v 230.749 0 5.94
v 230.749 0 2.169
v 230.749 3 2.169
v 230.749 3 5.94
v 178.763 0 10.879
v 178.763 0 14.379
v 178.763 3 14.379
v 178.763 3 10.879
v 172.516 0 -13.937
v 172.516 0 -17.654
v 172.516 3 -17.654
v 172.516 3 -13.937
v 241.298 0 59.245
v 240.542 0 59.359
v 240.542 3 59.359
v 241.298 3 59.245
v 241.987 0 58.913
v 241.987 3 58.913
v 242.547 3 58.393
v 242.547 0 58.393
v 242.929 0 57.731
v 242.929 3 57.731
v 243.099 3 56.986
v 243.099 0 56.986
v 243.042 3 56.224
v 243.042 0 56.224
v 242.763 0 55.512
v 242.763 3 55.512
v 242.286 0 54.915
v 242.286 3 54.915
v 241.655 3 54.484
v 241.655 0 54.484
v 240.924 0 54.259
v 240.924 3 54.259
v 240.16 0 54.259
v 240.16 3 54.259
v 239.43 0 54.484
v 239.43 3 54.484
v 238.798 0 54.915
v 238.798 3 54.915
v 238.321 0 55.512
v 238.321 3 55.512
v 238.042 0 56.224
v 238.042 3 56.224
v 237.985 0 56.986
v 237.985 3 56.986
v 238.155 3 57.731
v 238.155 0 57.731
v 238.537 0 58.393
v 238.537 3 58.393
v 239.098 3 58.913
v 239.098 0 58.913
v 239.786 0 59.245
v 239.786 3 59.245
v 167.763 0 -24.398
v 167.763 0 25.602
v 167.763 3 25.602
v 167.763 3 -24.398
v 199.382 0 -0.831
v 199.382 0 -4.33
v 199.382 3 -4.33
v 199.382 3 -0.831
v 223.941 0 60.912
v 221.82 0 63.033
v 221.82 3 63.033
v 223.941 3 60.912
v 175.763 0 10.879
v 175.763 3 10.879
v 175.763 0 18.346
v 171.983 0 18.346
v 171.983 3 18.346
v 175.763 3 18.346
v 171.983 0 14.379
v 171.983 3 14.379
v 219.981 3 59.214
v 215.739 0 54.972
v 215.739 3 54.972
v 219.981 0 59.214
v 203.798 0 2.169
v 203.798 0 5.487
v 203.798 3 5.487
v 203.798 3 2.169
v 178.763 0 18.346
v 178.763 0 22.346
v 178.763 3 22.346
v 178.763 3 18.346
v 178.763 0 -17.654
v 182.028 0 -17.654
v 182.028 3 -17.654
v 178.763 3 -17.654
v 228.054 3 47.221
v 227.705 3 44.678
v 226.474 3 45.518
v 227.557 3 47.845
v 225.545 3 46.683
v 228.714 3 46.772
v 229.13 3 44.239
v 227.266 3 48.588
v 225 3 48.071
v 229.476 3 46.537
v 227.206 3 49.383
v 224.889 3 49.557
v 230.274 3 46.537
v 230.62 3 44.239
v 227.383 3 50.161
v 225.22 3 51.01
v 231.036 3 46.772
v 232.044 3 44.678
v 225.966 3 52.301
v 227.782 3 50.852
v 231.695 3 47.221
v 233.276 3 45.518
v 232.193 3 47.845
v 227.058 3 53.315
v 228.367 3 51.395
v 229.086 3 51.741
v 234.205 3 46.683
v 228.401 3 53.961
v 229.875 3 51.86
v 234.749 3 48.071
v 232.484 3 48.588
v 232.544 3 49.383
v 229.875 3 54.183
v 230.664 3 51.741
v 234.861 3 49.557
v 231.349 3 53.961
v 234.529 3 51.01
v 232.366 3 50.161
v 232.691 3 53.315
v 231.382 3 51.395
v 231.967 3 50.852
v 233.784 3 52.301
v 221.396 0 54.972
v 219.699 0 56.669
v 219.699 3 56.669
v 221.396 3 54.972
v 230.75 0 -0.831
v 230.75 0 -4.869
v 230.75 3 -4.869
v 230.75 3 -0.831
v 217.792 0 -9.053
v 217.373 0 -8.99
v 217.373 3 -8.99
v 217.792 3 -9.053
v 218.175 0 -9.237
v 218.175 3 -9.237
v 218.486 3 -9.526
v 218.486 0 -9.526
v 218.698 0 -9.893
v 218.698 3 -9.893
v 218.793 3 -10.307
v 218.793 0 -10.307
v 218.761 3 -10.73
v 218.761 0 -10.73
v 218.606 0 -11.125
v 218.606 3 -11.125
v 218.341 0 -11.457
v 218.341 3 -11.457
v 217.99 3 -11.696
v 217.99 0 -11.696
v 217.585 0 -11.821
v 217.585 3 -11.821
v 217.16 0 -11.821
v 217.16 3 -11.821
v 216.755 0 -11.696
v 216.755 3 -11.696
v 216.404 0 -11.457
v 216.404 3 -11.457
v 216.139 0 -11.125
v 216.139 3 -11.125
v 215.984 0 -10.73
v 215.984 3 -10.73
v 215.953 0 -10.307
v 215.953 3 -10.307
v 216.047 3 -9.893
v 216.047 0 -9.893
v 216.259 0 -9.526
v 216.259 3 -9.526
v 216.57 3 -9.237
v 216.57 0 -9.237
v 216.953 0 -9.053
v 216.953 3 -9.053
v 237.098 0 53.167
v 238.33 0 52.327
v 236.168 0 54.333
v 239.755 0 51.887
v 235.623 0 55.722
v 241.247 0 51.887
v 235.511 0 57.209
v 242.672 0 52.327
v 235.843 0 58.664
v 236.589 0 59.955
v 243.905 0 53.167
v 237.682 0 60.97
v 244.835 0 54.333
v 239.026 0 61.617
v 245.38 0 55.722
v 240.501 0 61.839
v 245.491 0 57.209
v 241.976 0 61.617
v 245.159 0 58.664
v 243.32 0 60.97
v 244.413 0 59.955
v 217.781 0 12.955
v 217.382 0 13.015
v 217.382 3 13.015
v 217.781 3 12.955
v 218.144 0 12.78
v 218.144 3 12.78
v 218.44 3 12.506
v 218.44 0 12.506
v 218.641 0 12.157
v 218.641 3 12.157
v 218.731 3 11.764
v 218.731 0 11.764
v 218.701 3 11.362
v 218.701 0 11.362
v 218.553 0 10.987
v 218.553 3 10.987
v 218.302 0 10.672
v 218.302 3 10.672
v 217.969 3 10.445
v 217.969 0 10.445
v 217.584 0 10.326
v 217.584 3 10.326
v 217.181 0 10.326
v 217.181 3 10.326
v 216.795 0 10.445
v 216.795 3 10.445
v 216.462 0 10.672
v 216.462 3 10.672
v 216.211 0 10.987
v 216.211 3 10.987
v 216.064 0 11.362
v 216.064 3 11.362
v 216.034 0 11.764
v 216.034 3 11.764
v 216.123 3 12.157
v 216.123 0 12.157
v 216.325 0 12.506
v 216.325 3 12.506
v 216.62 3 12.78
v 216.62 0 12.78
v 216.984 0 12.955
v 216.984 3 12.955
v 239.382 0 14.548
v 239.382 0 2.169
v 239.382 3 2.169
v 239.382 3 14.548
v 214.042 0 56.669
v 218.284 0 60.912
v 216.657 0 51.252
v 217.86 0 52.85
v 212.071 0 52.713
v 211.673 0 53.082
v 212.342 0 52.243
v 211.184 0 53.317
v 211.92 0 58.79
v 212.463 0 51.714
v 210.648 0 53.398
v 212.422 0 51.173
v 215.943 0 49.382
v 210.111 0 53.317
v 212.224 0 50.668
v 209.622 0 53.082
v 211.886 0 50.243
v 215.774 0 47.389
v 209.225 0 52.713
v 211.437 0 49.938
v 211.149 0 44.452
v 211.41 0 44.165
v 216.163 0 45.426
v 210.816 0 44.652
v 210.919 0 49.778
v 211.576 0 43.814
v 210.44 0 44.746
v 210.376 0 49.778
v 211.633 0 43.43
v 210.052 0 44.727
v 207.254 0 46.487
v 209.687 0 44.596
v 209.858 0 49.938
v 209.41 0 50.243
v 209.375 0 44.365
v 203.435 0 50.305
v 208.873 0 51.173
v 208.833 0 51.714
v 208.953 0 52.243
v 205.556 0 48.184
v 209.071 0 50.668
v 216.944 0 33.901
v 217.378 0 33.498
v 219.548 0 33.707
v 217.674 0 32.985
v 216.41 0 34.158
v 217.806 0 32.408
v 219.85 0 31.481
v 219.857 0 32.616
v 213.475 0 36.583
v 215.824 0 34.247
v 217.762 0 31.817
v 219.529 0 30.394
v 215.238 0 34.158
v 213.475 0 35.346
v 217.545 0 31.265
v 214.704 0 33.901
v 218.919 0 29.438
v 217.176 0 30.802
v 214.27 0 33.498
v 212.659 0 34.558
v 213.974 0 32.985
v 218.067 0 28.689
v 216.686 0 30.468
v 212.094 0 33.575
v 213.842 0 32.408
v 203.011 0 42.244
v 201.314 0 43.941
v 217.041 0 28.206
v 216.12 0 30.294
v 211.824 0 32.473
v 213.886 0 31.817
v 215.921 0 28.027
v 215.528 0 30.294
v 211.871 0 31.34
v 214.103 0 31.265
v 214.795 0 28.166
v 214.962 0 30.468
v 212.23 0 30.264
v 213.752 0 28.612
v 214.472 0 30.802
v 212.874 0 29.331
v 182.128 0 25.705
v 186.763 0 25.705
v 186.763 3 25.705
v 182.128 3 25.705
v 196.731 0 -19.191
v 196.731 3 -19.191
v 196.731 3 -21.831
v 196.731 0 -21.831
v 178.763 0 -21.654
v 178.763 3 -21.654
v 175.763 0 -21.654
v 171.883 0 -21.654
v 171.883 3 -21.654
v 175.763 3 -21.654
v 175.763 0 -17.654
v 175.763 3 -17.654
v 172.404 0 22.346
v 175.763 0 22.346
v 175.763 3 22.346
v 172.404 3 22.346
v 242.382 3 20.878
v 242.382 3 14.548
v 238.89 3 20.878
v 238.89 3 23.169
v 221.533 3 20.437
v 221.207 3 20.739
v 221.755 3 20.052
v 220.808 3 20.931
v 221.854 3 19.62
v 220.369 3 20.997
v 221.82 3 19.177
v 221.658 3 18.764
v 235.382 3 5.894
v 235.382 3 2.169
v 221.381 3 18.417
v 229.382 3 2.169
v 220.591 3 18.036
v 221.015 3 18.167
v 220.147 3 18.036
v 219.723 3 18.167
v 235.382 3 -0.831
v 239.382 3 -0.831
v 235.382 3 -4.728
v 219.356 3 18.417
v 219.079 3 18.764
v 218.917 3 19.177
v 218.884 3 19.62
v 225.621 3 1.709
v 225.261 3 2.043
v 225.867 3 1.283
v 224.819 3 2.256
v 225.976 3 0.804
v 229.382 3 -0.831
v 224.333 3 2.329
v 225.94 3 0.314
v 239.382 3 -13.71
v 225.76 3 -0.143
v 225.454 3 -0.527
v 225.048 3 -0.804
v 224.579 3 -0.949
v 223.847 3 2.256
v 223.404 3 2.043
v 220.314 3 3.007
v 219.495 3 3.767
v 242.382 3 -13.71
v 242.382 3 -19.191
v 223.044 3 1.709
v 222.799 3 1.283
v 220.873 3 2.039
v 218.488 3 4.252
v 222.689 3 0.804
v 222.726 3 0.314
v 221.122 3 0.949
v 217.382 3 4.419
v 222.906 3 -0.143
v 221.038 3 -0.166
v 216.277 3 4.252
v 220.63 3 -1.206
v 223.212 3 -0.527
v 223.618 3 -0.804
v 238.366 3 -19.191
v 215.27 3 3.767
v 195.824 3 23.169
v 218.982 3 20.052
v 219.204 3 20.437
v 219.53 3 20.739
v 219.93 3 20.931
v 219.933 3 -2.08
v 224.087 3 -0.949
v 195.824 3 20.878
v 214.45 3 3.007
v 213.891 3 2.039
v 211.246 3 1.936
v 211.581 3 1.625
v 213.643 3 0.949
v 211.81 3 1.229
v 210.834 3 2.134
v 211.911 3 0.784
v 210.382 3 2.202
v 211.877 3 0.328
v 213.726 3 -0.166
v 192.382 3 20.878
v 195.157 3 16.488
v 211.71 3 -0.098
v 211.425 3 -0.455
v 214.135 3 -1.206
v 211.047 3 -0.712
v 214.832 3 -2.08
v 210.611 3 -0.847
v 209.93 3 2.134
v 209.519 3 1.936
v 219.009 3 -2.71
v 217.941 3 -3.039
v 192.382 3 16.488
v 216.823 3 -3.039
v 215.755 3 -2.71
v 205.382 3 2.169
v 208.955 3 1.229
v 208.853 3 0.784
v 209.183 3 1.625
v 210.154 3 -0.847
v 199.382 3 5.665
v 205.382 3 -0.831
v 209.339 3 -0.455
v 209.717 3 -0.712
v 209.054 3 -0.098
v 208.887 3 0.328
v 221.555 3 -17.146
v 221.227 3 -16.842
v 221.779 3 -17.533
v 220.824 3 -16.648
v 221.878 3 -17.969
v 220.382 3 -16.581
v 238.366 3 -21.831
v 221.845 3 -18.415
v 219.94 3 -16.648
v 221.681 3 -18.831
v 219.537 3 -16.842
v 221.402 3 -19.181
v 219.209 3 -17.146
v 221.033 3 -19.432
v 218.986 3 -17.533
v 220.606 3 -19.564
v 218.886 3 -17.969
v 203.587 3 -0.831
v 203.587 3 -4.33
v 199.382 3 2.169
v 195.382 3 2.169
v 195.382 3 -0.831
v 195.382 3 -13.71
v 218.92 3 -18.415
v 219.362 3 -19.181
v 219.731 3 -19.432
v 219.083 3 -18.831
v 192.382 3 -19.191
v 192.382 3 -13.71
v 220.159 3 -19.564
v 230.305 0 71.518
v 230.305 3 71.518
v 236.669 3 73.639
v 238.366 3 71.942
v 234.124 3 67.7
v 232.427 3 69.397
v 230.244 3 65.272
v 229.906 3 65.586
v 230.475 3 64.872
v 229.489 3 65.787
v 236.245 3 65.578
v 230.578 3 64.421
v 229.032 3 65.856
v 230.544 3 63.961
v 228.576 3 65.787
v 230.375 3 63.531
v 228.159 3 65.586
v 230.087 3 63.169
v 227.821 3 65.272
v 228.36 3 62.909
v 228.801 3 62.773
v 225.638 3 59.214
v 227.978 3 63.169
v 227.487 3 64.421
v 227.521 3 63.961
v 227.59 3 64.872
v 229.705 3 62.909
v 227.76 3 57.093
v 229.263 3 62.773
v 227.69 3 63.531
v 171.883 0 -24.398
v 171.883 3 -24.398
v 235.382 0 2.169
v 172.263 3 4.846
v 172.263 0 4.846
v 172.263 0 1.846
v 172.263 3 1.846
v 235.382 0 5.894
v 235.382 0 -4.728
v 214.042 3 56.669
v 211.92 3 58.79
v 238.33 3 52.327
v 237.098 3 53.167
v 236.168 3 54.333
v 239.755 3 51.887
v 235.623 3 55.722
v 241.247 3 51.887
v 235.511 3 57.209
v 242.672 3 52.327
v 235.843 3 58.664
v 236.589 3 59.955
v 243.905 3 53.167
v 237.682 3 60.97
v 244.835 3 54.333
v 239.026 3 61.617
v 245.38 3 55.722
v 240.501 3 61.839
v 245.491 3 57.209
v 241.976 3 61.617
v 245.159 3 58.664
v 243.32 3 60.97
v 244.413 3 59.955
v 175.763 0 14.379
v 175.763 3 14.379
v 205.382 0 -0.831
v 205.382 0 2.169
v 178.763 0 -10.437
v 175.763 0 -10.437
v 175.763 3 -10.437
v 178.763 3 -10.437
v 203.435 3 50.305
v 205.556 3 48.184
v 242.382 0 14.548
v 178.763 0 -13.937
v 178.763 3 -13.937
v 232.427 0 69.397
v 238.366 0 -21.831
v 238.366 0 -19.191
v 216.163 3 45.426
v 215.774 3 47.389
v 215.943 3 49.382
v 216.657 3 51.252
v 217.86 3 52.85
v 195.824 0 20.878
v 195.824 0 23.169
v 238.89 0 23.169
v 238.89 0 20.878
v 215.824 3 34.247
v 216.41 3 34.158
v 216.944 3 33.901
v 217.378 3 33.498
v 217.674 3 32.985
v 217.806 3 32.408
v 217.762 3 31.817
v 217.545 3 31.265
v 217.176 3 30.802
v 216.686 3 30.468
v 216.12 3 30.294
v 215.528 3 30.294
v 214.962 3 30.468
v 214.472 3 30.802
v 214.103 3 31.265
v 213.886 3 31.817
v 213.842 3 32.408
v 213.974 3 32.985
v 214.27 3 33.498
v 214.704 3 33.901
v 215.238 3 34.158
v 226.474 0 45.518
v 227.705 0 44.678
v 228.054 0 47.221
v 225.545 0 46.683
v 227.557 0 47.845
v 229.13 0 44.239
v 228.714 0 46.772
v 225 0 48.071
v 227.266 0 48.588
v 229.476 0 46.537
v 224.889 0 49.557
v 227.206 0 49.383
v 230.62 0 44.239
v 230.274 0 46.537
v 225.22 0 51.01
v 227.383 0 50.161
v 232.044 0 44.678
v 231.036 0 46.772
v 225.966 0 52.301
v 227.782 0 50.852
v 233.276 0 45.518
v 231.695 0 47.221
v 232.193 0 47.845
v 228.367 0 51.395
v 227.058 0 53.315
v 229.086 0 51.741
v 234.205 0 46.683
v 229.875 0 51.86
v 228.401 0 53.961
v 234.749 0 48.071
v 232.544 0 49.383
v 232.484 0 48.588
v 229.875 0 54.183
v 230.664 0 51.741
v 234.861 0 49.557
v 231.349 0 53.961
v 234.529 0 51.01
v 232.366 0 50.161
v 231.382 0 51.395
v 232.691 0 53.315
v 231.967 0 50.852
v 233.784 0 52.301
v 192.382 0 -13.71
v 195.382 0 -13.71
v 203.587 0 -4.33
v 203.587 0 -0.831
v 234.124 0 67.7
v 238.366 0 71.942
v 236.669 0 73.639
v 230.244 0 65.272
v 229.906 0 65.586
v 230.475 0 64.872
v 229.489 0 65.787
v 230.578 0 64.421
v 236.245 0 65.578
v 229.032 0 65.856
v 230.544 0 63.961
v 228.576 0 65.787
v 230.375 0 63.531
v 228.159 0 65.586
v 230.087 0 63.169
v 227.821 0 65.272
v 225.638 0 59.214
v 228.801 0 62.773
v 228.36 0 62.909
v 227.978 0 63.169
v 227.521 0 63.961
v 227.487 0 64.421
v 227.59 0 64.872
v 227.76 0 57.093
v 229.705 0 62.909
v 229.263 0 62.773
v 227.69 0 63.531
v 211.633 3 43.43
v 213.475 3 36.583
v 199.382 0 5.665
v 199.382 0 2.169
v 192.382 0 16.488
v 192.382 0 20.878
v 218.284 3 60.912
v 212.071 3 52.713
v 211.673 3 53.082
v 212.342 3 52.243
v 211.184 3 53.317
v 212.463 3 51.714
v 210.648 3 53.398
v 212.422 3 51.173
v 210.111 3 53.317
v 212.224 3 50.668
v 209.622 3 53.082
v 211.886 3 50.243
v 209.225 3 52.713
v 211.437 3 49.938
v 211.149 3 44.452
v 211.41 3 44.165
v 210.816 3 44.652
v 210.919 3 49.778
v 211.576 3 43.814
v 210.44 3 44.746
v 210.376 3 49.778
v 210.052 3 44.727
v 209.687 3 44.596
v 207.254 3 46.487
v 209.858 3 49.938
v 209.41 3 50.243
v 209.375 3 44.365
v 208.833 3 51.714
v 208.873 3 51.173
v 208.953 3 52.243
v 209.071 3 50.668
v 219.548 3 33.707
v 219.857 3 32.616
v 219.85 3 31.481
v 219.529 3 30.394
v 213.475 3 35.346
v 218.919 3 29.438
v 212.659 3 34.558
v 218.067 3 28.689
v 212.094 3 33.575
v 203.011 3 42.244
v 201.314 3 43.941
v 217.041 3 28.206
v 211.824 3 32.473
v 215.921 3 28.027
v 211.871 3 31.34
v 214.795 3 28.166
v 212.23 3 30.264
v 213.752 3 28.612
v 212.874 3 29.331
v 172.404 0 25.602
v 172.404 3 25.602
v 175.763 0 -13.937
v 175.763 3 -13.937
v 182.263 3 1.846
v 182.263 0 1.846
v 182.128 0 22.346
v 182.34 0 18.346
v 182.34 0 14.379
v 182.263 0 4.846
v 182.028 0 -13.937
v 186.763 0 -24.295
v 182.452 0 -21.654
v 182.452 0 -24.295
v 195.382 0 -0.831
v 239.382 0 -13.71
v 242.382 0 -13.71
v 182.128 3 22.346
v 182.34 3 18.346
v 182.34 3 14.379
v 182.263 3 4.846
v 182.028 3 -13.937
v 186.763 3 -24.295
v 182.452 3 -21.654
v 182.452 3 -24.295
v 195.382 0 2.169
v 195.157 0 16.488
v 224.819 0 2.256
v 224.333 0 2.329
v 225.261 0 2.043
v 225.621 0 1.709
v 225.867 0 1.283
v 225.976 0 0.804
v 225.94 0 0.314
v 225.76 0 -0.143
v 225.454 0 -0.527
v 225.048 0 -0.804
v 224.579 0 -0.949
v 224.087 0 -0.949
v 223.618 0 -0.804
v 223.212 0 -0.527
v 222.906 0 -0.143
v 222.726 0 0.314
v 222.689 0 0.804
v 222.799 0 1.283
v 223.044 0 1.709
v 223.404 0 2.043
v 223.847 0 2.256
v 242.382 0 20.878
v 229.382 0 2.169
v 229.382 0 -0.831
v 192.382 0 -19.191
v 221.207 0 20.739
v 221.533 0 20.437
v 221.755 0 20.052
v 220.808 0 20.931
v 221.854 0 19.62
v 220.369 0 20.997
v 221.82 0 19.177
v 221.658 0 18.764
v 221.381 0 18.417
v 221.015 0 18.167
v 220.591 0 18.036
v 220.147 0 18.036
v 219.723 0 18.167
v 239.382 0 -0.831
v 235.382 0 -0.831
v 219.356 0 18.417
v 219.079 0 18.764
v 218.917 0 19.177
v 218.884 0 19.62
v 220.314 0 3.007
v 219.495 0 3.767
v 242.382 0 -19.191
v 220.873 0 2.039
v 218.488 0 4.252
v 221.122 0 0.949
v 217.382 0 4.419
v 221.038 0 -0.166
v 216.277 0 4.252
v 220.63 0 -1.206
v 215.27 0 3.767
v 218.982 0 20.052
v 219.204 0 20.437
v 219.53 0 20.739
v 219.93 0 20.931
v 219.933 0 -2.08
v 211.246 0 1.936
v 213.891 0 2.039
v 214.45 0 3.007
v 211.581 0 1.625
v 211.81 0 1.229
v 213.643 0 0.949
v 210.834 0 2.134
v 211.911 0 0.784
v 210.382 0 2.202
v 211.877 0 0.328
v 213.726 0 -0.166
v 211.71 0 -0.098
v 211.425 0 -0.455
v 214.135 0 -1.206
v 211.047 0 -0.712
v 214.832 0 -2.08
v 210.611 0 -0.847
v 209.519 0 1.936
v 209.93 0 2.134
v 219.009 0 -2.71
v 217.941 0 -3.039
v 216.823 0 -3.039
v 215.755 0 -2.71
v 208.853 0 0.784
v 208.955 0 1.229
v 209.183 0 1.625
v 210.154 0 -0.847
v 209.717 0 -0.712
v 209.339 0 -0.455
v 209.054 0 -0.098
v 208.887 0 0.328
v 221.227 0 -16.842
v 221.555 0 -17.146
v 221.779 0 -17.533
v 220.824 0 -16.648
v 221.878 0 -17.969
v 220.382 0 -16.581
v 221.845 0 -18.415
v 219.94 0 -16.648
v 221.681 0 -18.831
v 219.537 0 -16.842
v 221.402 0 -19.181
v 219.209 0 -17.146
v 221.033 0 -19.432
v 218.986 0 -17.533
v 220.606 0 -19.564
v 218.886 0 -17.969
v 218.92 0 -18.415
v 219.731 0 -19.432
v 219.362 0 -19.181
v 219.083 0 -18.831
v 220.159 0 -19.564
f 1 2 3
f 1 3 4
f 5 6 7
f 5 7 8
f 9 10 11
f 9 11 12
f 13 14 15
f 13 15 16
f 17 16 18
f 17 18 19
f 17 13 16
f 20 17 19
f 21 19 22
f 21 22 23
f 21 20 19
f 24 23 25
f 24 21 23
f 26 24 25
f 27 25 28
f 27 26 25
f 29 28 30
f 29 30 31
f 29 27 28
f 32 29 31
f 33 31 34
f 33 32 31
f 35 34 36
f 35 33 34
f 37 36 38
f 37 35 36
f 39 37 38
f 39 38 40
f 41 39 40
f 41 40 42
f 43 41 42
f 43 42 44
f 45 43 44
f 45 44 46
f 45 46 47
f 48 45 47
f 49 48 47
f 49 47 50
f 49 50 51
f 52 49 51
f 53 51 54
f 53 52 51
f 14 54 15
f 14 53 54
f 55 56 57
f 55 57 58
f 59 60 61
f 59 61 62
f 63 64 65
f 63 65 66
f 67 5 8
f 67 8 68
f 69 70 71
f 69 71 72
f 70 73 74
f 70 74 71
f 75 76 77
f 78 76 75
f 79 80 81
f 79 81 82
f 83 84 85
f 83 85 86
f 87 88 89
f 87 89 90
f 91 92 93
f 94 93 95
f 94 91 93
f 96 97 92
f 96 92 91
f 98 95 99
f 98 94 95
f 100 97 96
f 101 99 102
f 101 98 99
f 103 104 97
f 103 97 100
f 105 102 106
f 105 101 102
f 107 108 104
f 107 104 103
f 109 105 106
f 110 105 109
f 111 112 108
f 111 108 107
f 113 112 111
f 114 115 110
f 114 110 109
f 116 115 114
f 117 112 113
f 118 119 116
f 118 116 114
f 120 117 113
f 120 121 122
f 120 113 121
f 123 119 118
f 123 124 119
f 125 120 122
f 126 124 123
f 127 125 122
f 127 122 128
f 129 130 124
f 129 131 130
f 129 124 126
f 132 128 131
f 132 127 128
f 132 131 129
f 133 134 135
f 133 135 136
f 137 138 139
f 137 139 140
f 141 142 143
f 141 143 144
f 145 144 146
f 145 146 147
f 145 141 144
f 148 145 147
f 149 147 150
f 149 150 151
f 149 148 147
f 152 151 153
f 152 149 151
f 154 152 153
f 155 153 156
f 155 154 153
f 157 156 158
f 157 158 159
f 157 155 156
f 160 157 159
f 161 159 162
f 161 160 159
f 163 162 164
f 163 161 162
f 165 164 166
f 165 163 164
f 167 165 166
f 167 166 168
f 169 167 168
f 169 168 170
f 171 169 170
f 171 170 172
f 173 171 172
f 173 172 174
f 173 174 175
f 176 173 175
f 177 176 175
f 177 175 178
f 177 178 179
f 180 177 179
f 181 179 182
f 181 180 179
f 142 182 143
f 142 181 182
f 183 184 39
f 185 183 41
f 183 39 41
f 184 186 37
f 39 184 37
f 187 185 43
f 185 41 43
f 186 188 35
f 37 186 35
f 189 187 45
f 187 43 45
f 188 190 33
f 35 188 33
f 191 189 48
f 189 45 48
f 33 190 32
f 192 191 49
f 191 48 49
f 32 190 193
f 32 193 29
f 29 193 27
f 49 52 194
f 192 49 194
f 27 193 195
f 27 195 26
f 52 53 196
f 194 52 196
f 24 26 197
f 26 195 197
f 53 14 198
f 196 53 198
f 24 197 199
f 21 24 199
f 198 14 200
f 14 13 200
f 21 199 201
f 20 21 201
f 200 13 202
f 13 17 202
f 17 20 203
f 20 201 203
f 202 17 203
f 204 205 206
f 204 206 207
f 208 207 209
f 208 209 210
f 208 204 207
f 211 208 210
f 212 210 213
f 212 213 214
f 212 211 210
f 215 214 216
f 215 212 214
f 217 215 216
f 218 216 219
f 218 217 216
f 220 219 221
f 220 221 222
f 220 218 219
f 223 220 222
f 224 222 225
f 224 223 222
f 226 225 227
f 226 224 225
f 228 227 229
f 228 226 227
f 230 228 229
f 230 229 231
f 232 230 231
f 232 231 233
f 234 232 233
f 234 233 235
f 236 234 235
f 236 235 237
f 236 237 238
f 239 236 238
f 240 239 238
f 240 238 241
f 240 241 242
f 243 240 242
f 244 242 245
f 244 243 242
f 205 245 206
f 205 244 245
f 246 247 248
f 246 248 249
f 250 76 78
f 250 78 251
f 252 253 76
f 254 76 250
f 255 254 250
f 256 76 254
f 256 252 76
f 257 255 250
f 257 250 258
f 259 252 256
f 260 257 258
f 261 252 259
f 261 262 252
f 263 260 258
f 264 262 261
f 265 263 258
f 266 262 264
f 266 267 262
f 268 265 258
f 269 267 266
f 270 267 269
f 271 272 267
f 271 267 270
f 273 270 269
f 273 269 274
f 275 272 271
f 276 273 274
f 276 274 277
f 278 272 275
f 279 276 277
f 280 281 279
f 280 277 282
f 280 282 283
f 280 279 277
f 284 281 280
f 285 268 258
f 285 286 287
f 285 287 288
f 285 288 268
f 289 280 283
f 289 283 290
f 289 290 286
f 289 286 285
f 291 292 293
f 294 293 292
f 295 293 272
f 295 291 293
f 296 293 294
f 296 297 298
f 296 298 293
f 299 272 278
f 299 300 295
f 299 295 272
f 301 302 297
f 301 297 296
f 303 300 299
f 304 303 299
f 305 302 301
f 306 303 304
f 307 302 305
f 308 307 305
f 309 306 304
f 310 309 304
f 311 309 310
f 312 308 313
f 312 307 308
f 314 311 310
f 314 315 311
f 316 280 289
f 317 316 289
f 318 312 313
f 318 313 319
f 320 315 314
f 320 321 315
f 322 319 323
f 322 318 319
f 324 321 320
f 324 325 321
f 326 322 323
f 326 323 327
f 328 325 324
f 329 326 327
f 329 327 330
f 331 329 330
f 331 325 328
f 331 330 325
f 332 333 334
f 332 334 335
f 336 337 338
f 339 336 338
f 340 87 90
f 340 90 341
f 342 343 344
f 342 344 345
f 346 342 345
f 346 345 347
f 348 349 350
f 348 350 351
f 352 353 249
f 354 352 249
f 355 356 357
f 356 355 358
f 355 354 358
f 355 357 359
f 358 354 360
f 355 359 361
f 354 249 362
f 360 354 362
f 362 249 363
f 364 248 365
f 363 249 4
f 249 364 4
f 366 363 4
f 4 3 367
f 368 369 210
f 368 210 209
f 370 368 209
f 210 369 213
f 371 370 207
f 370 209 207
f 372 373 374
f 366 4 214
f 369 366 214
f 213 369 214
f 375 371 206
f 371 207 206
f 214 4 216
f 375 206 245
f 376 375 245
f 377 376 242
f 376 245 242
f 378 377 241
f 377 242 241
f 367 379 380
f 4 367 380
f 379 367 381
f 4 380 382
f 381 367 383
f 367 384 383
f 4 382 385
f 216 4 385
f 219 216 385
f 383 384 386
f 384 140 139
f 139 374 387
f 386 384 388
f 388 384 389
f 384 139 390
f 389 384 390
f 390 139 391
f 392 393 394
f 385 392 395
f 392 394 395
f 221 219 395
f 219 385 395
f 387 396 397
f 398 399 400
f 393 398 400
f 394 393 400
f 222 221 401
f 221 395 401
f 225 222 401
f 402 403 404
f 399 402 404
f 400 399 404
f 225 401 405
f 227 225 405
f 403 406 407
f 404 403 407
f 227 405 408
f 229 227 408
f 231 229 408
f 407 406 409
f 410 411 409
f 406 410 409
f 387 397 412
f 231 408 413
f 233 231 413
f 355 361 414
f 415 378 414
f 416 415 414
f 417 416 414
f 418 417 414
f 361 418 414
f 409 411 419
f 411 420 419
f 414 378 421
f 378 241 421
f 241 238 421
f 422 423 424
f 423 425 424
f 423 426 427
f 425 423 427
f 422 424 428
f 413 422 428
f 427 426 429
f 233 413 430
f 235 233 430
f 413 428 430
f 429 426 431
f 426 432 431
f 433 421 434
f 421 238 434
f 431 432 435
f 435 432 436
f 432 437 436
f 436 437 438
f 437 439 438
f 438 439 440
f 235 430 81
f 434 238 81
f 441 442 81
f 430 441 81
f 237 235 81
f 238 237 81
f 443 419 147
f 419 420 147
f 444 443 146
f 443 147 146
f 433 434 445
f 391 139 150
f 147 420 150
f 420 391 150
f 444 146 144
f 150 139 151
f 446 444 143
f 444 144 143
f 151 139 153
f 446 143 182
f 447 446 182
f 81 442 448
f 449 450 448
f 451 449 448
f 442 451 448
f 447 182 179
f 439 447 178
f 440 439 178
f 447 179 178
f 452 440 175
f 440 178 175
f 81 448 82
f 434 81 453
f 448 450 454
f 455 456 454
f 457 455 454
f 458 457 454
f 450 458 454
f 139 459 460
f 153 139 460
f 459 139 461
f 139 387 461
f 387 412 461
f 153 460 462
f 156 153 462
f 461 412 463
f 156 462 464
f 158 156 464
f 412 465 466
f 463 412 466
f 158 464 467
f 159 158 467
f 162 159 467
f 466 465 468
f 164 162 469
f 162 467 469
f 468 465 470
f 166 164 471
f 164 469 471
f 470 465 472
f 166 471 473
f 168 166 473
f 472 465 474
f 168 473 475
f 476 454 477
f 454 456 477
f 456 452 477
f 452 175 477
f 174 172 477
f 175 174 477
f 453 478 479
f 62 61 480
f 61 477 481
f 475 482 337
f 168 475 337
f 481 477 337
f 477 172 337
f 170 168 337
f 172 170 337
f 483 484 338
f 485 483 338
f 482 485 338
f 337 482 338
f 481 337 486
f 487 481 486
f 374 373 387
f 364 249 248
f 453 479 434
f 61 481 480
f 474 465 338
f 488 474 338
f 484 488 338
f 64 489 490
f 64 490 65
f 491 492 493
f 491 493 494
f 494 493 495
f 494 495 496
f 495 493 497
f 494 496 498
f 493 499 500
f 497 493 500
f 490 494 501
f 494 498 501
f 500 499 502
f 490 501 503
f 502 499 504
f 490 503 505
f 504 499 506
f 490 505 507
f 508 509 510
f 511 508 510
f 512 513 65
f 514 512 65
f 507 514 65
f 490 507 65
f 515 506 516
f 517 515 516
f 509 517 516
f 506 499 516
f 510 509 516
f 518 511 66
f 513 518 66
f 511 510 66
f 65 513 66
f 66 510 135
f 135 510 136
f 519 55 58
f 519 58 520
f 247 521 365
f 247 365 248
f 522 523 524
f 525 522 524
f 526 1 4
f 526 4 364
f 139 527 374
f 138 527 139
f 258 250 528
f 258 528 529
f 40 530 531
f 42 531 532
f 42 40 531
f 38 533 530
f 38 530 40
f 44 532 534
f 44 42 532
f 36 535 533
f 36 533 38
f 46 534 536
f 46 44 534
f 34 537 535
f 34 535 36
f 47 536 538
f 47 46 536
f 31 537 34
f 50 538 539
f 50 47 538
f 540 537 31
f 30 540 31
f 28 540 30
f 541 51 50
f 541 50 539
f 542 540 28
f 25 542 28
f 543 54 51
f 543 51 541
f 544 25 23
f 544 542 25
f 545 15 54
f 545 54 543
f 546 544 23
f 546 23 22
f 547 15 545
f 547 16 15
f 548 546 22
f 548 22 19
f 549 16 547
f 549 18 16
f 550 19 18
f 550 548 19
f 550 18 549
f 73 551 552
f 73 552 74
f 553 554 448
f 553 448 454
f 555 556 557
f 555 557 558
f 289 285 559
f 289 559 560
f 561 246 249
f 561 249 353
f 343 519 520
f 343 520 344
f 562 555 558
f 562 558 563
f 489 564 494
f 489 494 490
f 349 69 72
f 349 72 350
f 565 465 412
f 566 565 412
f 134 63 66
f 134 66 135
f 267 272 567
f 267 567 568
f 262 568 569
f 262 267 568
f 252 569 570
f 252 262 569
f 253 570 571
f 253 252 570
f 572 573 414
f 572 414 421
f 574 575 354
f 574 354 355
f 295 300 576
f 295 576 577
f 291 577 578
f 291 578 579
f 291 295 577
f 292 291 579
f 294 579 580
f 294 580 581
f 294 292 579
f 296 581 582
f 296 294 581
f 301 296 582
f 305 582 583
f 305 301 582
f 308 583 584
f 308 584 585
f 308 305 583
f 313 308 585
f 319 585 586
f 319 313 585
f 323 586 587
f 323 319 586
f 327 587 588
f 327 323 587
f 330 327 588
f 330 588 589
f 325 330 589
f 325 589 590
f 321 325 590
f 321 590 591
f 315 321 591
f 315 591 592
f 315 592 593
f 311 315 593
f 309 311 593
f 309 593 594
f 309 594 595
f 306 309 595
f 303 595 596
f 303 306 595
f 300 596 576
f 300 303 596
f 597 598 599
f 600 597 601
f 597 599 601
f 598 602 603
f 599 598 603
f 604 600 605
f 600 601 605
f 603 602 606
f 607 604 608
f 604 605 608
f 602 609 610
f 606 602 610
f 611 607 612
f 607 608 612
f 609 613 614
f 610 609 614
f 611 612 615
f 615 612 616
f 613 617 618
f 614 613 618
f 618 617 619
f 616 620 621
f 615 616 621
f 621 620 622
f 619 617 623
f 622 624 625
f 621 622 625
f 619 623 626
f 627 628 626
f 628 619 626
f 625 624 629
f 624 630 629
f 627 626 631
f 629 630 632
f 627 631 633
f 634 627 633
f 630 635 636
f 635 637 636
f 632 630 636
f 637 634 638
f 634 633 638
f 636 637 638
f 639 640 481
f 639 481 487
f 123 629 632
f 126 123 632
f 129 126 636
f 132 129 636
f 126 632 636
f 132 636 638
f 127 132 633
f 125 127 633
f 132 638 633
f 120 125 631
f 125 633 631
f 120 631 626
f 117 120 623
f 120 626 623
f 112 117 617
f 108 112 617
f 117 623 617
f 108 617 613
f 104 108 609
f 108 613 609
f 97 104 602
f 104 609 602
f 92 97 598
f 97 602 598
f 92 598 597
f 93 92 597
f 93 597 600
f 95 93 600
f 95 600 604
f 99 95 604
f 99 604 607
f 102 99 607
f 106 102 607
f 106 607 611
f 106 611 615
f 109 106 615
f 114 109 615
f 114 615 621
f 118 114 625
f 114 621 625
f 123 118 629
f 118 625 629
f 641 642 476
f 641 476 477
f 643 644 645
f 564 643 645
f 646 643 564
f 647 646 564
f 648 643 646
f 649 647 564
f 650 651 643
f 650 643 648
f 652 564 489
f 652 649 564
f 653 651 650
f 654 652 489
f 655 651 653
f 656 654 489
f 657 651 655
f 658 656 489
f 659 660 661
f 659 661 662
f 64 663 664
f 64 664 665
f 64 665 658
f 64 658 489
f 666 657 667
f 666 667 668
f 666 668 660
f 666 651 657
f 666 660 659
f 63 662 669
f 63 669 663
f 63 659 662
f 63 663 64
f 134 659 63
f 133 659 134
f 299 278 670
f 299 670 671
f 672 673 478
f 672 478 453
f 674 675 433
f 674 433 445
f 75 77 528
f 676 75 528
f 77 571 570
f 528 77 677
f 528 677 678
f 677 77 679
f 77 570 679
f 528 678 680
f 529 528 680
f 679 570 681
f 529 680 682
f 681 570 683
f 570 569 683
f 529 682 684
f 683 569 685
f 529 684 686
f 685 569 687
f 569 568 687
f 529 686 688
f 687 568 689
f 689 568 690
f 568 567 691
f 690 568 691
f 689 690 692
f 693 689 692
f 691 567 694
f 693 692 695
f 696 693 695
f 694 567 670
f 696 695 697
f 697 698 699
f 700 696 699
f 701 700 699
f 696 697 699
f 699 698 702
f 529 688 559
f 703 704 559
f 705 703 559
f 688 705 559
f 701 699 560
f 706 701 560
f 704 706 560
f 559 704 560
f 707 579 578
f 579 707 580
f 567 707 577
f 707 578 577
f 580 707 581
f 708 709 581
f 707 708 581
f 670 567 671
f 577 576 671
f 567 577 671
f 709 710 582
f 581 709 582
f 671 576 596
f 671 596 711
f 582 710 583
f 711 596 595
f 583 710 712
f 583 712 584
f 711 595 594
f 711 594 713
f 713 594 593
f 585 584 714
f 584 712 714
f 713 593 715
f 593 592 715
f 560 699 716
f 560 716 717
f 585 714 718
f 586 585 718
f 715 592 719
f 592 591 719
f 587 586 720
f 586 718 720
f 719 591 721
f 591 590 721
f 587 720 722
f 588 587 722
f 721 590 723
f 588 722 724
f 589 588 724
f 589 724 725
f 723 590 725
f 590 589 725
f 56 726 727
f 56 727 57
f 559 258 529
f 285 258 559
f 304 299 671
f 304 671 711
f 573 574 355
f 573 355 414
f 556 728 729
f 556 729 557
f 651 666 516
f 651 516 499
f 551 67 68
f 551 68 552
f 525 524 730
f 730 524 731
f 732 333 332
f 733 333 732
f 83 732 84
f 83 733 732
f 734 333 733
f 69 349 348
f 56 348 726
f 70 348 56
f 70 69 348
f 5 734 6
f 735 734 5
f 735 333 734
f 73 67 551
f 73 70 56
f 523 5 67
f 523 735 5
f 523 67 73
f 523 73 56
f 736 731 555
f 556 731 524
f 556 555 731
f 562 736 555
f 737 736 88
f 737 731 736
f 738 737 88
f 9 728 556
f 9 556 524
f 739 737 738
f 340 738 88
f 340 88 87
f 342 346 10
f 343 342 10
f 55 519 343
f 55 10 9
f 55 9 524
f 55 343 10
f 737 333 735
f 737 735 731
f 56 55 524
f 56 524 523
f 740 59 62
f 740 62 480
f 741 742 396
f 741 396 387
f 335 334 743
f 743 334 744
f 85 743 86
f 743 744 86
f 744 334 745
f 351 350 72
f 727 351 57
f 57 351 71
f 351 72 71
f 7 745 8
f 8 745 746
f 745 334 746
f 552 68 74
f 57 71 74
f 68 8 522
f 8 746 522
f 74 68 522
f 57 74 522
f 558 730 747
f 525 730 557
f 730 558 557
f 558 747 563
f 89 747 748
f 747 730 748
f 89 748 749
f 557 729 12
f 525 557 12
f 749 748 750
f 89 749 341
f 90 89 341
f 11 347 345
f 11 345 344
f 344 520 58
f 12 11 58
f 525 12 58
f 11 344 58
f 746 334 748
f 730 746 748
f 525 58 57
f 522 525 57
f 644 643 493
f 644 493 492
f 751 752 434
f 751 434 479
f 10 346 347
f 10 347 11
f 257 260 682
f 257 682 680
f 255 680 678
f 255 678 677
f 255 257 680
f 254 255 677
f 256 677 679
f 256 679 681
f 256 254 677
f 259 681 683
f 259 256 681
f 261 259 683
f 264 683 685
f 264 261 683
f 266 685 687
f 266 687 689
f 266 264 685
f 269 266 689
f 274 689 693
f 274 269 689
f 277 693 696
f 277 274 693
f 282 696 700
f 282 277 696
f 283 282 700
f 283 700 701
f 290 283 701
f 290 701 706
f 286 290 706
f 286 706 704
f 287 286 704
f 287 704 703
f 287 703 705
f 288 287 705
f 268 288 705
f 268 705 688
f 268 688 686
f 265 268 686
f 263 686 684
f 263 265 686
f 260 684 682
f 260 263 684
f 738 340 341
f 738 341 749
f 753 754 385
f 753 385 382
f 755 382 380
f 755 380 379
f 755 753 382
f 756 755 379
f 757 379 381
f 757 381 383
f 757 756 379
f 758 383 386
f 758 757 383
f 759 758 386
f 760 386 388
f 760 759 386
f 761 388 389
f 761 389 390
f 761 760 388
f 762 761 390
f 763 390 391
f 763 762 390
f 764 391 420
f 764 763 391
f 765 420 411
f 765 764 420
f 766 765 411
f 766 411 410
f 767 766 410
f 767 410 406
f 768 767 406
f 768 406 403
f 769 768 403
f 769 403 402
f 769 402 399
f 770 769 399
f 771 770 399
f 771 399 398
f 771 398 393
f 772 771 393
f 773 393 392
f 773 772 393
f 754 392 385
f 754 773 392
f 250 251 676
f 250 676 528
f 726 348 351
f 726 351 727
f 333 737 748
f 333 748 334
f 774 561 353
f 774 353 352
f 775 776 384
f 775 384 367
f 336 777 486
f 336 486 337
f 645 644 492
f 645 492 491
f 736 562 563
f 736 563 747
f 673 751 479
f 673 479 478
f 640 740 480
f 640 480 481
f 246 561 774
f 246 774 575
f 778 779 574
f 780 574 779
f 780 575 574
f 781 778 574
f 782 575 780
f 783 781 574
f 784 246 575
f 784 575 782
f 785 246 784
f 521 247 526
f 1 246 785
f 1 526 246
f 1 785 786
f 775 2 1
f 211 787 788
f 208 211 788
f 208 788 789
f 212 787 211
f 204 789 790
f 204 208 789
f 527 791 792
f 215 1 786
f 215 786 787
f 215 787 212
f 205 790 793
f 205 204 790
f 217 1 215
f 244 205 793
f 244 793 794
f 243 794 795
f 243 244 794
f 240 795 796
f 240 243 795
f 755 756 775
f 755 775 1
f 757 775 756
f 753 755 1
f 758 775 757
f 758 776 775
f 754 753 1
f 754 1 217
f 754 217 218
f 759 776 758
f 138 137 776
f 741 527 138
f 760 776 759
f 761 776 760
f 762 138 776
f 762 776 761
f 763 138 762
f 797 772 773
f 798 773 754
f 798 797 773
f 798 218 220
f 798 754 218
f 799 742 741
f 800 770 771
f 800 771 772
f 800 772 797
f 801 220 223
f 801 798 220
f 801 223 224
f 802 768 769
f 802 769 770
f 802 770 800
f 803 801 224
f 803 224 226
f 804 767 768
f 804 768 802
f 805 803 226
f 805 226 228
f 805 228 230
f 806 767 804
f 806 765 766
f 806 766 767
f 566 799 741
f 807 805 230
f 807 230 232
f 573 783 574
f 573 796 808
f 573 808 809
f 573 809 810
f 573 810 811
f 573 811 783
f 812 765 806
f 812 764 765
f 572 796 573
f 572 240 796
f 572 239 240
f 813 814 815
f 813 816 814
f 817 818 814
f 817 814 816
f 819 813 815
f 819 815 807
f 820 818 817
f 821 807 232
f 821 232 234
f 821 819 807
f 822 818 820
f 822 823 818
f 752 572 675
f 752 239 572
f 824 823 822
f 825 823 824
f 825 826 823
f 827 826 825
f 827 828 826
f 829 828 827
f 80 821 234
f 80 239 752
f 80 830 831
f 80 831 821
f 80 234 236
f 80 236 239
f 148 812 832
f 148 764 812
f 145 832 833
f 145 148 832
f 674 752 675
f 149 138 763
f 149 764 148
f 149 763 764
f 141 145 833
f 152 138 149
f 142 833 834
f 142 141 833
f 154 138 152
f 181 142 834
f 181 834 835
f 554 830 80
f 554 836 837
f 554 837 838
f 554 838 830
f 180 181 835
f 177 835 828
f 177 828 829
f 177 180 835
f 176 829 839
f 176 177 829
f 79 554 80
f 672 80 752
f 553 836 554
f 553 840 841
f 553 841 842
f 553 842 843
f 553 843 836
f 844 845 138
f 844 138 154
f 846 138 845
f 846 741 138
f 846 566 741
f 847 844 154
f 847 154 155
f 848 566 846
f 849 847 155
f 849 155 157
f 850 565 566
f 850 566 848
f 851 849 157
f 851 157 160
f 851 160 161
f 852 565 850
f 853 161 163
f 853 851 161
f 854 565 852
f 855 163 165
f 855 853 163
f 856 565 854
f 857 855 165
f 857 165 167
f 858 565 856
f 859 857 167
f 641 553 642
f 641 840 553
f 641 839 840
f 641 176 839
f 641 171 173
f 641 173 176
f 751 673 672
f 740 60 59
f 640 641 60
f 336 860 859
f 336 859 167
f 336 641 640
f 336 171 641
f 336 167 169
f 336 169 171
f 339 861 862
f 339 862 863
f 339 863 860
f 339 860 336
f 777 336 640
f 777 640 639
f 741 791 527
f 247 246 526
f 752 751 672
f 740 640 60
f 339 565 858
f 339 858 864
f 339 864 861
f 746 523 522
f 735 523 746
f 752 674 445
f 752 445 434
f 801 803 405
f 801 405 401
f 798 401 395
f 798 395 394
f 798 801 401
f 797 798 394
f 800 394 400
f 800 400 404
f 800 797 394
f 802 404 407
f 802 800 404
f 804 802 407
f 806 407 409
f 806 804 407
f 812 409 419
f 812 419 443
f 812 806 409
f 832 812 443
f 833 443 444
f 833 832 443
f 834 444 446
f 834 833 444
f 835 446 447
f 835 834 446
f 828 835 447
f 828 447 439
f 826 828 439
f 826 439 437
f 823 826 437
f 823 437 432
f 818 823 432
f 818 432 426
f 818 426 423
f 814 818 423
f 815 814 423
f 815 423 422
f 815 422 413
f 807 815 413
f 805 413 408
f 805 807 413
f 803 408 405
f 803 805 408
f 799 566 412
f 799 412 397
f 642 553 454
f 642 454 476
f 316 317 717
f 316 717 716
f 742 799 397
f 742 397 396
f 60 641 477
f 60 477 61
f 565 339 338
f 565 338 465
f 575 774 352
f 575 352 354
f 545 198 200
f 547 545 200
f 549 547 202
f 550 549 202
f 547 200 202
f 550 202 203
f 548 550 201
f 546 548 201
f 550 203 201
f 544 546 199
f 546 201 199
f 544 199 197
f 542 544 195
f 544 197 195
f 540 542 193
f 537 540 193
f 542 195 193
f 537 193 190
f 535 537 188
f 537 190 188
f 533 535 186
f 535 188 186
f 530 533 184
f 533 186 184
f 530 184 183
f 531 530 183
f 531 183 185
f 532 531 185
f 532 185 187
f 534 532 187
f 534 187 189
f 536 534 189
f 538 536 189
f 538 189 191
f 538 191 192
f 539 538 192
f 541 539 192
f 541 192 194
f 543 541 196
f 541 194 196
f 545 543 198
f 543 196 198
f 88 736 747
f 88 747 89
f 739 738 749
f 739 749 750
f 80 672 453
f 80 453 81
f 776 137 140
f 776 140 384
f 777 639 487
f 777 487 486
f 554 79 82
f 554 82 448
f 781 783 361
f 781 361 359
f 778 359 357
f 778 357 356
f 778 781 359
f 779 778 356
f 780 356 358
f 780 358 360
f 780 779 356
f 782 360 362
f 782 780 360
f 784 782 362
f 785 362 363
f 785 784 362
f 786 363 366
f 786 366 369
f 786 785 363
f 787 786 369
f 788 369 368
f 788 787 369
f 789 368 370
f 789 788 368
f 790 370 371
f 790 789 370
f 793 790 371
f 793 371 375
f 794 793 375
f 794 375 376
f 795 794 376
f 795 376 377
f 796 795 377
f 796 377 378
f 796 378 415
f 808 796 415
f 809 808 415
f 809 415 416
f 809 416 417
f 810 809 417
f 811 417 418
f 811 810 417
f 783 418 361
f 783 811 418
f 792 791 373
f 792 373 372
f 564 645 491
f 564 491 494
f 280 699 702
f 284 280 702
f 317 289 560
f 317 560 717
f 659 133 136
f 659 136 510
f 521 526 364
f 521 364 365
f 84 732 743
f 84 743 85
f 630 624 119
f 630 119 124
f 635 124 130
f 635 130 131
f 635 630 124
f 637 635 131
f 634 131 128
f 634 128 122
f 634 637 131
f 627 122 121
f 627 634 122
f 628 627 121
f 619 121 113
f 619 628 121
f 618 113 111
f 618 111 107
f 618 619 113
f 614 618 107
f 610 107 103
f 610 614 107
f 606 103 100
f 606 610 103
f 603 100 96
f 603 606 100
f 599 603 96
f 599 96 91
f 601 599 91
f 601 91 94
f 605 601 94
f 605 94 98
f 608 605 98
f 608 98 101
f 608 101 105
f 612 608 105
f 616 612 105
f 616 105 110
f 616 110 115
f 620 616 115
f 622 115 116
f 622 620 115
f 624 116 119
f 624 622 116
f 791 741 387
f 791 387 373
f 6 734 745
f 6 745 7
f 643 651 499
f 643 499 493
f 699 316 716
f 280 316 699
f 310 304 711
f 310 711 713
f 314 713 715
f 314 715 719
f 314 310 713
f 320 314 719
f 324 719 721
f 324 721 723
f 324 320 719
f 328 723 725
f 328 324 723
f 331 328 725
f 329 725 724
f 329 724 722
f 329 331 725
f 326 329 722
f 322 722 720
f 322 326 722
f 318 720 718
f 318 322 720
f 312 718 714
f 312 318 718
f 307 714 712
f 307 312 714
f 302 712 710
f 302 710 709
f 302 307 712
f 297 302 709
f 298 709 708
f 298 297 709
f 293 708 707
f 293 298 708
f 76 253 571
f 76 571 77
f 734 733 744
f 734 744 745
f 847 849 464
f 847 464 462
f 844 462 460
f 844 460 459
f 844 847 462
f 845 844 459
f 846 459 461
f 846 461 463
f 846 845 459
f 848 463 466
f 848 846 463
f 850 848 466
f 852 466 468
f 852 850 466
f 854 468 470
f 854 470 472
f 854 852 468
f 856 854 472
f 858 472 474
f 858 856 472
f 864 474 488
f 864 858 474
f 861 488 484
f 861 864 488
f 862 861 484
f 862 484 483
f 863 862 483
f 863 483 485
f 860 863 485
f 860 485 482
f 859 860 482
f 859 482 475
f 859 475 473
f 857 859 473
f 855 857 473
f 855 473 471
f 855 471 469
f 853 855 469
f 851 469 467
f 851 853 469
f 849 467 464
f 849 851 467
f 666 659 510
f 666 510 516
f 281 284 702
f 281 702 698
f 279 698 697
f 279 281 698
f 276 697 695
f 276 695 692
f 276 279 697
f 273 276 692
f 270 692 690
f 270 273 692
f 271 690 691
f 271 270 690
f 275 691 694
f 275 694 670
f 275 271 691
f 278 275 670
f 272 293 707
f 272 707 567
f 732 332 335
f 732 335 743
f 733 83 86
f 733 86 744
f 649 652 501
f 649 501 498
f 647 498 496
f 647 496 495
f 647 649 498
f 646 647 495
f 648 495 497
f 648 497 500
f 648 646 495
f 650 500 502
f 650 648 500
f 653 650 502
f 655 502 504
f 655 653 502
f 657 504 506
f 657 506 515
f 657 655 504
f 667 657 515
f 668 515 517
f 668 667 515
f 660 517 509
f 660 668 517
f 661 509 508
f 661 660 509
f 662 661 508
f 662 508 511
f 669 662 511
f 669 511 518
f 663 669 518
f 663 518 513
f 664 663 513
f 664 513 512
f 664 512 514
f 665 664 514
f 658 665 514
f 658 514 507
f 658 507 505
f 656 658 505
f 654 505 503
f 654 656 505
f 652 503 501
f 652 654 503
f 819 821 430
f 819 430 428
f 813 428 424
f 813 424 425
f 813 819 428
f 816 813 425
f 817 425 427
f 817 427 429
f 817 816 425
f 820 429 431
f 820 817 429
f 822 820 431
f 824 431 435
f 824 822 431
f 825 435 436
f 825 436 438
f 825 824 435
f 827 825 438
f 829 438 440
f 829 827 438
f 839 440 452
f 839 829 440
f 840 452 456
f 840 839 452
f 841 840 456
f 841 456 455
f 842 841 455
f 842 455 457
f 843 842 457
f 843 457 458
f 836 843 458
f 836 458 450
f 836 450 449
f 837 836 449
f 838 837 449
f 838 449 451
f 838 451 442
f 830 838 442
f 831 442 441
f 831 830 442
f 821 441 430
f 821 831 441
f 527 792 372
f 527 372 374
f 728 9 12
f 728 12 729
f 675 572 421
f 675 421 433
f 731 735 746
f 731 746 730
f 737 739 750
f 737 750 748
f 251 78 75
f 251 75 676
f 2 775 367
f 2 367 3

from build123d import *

# Parameters (mm, degrees)
SKETCH6_R             = 5.00001662
SKETCH6_R_2           = 2.676301768
BOSS_EXTRUDE1_DEPTH   = 3
SKETCH6_R_3           = 5.003976988
SKETCH6_R_4           = 2.564352457
BOSS_EXTRUDE1_2_DEPTH = 3
SKETCH6_R_5           = 3.75
SKETCH6_R_6           = 1.53326
SKETCH6_R_7           = 1.42391285
SKETCH6_R_8           = 1.648176726
SKETCH6_R_9           = 1.5
SKETCH6_R_10          = 1.352434515
SKETCH6_R_11          = 1.489057141
BOSS_EXTRUDE1_3_DEPTH = 3
SKETCH6_W             = 10
SKETCH6_H             = 3
BOSS_EXTRUDE1_4_DEPTH = 3
SKETCH6_R_12          = 1.987556524
SKETCH6_R_13          = 1.820084062
BOSS_EXTRUDE1_5_DEPTH = 3
SKETCH6_R_14          = 1.549963263
BOSS_EXTRUDE1_6_DEPTH = 3


with BuildPart() as part:
    # Sketch6 → Boss-Extrude1 (new body)
    with BuildSketch(Plane(origin=(0, 0, -6.873626876), x_dir=(1, 0, 0), z_dir=(0, 1, 0))):
        with Locations(Location((229.874784709, -56.056944562, 0), (0, 0, 270))):
            Circle(SKETCH6_R)
        with Locations(Location((229.874784709, -56.056944562, 0), (0, 0, 270))):
            Circle(SKETCH6_R_2, mode=Mode.SUBTRACT)
    extrude(amount=BOSS_EXTRUDE1_DEPTH)


with BuildPart() as body_2:
    # Sketch6 → Boss-Extrude1 2 (new body)
    with BuildSketch(Plane(origin=(0, 0, -6.873626876), x_dir=(1, 0, 0), z_dir=(0, 1, 0))):
        with Locations(Location((240.501206391, -63.709072507, 0), (0, 0, 270))):
            Circle(SKETCH6_R_3)
        with Locations(Location((240.542284709, -63.667989562, 0), (0, 0, 270))):
            Circle(SKETCH6_R_4, mode=Mode.SUBTRACT)
    extrude(amount=BOSS_EXTRUDE1_2_DEPTH)


with BuildPart() as body_3:
    # Sketch6 → Boss-Extrude1 3 (new body)
    with BuildSketch(Plane(origin=(0, 0, -6.873626876), x_dir=(1, 0, 0), z_dir=(0, 1, 0))):
        Polygon((242.382239794, 6.836701249), (239.382239794, 6.836701249), (239.382239794, -6.042586825), (235.382239794, -6.042586825), (235.382239794, -2.14531779), (230.749800061, -2.004695449), (230.749800061, -6.042586825), (229.382239794, -6.042586825), (229.382239794, -9.042586825), (230.748691654, -9.042586825), (230.748691654, -12.813516805), (235.382239794, -12.767263811), (235.382239794, -9.042586825), (239.382239794, -9.042586825), (239.382239794, -21.421316018), (242.382239794, -21.421316018), (242.382239794, -27.751611143), (238.890190267, -27.751611143), (238.890190267, -30.042586825), (195.823762638, -30.042586825), (195.823762638, -27.751611143), (192.382239794, -27.751611143), (192.382239794, -23.361733729), (195.157204069, -23.361733729), (195.382239794, -9.042586825), (199.382239794, -9.042586825), (199.382239794, -12.539051999), (203.797700047, -12.360940289), (203.797700047, -9.042586825), (205.382239794, -9.042586825), (205.382239794, -6.042586825), (203.587068887, -6.042586825), (203.587068887, -2.54340954), (199.382239794, -2.54340954), (199.382239794, -6.042586825), (195.382239794, -6.042586825), (195.382239794, 6.836593447), (192.382239794, 6.836593447), (192.382239794, 12.317708836), (196.731116236, 12.317708836), (196.731116236, 14.957413175), (238.366254708, 14.957413175), (238.366254708, 12.317708836), (242.382239794, 12.317708836), align=None)
        with Locations(Location((217.382239794, -7.542579319, 0), (0, 0, 270))):
            Circle(SKETCH6_R_5, mode=Mode.SUBTRACT)
        with Locations(Location((210.382239794, -7.542586825, 0), (0, 0, 270))):
            Circle(SKETCH6_R_6, mode=Mode.SUBTRACT)
        with Locations(Location((217.372614794, 3.539788175, 0), (0, 0, 270))):
            Circle(SKETCH6_R_7, mode=Mode.SUBTRACT)
        with Locations(Location((224.332886765, -7.554518996, 0), (0, 0, 270))):
            Circle(SKETCH6_R_8, mode=Mode.SUBTRACT)
        with Locations(Location((220.382239794, 11.207413175, 0), (0, 0, 270))):
            Circle(SKETCH6_R_9, mode=Mode.SUBTRACT)
        with Locations(Location((217.382239794, -18.536664507, 0), (0, 0, 270))):
            Circle(SKETCH6_R_10, mode=Mode.SUBTRACT)
        with Locations(Location((220.368609085, -26.382015564, 0), (0, 0, 270))):
            Circle(SKETCH6_R_11, mode=Mode.SUBTRACT)
    extrude(amount=BOSS_EXTRUDE1_3_DEPTH)


with BuildPart() as body_4:
    # Sketch6 → Boss-Extrude1 4 (new body)
    with BuildSketch(Plane(origin=(0, 0, -6.873626876), x_dir=(1, 0, 0), z_dir=(0, 1, 0))):
        Polygon((171.883428579, 17.523976804), (171.883428579, 14.779888825), (175.763491707, 14.779888825), (175.763491707, 10.779888825), (172.516185966, 10.779888825), (172.516185966, 7.062992514), (175.763491707, 7.062992514), (175.763491707, 3.562992514), (178.763491707, 3.562992514), (178.763491707, 7.062992514), (182.028068614, 7.062992514), (182.028068614, 10.779888825), (178.763491707, 10.779888825), (178.763491707, 14.779888825), (182.452460556, 14.779888825), (182.452460556, 17.421571169), (186.763491707, 17.421571169), (186.763491707, -32.578428831), (182.127695455, -32.578428831), (182.127695455, -29.220111175), (178.763491707, -29.220111175), (178.763491707, -25.220111175), (182.34039673, -25.220111175), (182.34039673, -21.252563381), (178.763491707, -21.252563381), (178.763491707, -17.752563381), (175.763491707, -17.752563381), (175.763491707, -21.252563381), (171.982778318, -21.252563381), (171.982778318, -25.220111175), (175.763491707, -25.220111175), (175.763491707, -29.220111175), (172.40417104, -29.220111175), (172.40417104, -32.476023196), (167.763491707, -32.476023196), (167.763491707, 17.523976804), align=None)
        with Locations((177.263491707, -10.220111175)):
            Rectangle(SKETCH6_W, SKETCH6_H, mode=Mode.SUBTRACT)
    extrude(amount=BOSS_EXTRUDE1_4_DEPTH)


with BuildPart() as body_5:
    # Sketch6 → Boss-Extrude1 5 (new body)
    with BuildSketch(Plane(origin=(0, 0, -6.873626876), x_dir=(1, 0, 0), z_dir=(0, 1, 0))):
        with BuildLine():
            Line((217.860134709, -59.724119562), (215.738834709, -61.845439562))
            Line((215.738834709, -61.845439562), (219.981434709, -66.088079562))
            Line((219.981434709, -66.088079562), (218.284434709, -67.785139562))
            Line((218.284434709, -67.785139562), (214.041739708, -63.542484562))
            Line((214.041739708, -63.542484562), (211.920434709, -65.663809562))
            Line((211.920434709, -65.663809562), (203.435134709, -57.178529562))
            Line((203.435134709, -57.178529562), (205.556434709, -55.057209562))
            Line((205.556434709, -55.057209562), (201.313834709, -50.814569562))
            Line((201.313834709, -50.814569562), (203.010934709, -49.117519562))
            Line((203.010934709, -49.117519562), (207.253534709, -53.360159562))
            Line((207.253534709, -53.360159562), (209.374834709, -51.238839562))
            ThreePointArc((209.374834709, -51.238839562), (210.816400769, -51.525579581), (211.632980333, -50.303478783))
            Line((211.632980333, -50.303478783), (213.474534709, -43.456719562))
            Line((213.474534709, -43.456719562), (213.474534709, -42.219932453))
            ThreePointArc((213.474534709, -42.219932453), (214.794826347, -35.039859898), (219.548340876, -40.580682177))
            Line((219.548340876, -40.580682177), (216.163084709, -52.299499562))
            ThreePointArc((216.163084709, -52.299499562), (215.942727144, -56.256124713), (217.860134709, -59.724119562))
        make_face()
        with Locations(Location((215.824034709, -39.132809562, 0), (0, 0, 270))):
            Circle(SKETCH6_R_12, mode=Mode.SUBTRACT)
        with Locations(Location((210.647634709, -58.451324562, 0), (0, 0, 270))):
            Circle(SKETCH6_R_13, mode=Mode.SUBTRACT)
    extrude(amount=BOSS_EXTRUDE1_5_DEPTH)


with BuildPart() as body_6:
    # Sketch6 → Boss-Extrude1 6 (new body)
    with BuildSketch(Plane(origin=(0, 0, -6.873626876), x_dir=(1, 0, 0), z_dir=(0, 1, 0))):
        Polygon((227.759629709, -63.966754562), (236.244954708, -72.452019563), (234.123654708, -74.573339563), (238.366254708, -78.815979563), (236.669154708, -80.513039563), (232.426554708, -76.270399563), (230.305254708, -78.391719563), (221.819934709, -69.906459562), (223.941234709, -67.785139562), (219.698634709, -63.542489562), (221.395634709, -61.845439562), (225.638334709, -66.088079562), align=None)
        with Locations(Location((229.032434709, -71.179244562, 0), (0, 0, 270))):
            Circle(SKETCH6_R_14, mode=Mode.SUBTRACT)
    extrude(amount=BOSS_EXTRUDE1_6_DEPTH)


solid = Compound([part.part, body_2.part, body_3.part, body_4.part, body_5.part, body_6.part])
